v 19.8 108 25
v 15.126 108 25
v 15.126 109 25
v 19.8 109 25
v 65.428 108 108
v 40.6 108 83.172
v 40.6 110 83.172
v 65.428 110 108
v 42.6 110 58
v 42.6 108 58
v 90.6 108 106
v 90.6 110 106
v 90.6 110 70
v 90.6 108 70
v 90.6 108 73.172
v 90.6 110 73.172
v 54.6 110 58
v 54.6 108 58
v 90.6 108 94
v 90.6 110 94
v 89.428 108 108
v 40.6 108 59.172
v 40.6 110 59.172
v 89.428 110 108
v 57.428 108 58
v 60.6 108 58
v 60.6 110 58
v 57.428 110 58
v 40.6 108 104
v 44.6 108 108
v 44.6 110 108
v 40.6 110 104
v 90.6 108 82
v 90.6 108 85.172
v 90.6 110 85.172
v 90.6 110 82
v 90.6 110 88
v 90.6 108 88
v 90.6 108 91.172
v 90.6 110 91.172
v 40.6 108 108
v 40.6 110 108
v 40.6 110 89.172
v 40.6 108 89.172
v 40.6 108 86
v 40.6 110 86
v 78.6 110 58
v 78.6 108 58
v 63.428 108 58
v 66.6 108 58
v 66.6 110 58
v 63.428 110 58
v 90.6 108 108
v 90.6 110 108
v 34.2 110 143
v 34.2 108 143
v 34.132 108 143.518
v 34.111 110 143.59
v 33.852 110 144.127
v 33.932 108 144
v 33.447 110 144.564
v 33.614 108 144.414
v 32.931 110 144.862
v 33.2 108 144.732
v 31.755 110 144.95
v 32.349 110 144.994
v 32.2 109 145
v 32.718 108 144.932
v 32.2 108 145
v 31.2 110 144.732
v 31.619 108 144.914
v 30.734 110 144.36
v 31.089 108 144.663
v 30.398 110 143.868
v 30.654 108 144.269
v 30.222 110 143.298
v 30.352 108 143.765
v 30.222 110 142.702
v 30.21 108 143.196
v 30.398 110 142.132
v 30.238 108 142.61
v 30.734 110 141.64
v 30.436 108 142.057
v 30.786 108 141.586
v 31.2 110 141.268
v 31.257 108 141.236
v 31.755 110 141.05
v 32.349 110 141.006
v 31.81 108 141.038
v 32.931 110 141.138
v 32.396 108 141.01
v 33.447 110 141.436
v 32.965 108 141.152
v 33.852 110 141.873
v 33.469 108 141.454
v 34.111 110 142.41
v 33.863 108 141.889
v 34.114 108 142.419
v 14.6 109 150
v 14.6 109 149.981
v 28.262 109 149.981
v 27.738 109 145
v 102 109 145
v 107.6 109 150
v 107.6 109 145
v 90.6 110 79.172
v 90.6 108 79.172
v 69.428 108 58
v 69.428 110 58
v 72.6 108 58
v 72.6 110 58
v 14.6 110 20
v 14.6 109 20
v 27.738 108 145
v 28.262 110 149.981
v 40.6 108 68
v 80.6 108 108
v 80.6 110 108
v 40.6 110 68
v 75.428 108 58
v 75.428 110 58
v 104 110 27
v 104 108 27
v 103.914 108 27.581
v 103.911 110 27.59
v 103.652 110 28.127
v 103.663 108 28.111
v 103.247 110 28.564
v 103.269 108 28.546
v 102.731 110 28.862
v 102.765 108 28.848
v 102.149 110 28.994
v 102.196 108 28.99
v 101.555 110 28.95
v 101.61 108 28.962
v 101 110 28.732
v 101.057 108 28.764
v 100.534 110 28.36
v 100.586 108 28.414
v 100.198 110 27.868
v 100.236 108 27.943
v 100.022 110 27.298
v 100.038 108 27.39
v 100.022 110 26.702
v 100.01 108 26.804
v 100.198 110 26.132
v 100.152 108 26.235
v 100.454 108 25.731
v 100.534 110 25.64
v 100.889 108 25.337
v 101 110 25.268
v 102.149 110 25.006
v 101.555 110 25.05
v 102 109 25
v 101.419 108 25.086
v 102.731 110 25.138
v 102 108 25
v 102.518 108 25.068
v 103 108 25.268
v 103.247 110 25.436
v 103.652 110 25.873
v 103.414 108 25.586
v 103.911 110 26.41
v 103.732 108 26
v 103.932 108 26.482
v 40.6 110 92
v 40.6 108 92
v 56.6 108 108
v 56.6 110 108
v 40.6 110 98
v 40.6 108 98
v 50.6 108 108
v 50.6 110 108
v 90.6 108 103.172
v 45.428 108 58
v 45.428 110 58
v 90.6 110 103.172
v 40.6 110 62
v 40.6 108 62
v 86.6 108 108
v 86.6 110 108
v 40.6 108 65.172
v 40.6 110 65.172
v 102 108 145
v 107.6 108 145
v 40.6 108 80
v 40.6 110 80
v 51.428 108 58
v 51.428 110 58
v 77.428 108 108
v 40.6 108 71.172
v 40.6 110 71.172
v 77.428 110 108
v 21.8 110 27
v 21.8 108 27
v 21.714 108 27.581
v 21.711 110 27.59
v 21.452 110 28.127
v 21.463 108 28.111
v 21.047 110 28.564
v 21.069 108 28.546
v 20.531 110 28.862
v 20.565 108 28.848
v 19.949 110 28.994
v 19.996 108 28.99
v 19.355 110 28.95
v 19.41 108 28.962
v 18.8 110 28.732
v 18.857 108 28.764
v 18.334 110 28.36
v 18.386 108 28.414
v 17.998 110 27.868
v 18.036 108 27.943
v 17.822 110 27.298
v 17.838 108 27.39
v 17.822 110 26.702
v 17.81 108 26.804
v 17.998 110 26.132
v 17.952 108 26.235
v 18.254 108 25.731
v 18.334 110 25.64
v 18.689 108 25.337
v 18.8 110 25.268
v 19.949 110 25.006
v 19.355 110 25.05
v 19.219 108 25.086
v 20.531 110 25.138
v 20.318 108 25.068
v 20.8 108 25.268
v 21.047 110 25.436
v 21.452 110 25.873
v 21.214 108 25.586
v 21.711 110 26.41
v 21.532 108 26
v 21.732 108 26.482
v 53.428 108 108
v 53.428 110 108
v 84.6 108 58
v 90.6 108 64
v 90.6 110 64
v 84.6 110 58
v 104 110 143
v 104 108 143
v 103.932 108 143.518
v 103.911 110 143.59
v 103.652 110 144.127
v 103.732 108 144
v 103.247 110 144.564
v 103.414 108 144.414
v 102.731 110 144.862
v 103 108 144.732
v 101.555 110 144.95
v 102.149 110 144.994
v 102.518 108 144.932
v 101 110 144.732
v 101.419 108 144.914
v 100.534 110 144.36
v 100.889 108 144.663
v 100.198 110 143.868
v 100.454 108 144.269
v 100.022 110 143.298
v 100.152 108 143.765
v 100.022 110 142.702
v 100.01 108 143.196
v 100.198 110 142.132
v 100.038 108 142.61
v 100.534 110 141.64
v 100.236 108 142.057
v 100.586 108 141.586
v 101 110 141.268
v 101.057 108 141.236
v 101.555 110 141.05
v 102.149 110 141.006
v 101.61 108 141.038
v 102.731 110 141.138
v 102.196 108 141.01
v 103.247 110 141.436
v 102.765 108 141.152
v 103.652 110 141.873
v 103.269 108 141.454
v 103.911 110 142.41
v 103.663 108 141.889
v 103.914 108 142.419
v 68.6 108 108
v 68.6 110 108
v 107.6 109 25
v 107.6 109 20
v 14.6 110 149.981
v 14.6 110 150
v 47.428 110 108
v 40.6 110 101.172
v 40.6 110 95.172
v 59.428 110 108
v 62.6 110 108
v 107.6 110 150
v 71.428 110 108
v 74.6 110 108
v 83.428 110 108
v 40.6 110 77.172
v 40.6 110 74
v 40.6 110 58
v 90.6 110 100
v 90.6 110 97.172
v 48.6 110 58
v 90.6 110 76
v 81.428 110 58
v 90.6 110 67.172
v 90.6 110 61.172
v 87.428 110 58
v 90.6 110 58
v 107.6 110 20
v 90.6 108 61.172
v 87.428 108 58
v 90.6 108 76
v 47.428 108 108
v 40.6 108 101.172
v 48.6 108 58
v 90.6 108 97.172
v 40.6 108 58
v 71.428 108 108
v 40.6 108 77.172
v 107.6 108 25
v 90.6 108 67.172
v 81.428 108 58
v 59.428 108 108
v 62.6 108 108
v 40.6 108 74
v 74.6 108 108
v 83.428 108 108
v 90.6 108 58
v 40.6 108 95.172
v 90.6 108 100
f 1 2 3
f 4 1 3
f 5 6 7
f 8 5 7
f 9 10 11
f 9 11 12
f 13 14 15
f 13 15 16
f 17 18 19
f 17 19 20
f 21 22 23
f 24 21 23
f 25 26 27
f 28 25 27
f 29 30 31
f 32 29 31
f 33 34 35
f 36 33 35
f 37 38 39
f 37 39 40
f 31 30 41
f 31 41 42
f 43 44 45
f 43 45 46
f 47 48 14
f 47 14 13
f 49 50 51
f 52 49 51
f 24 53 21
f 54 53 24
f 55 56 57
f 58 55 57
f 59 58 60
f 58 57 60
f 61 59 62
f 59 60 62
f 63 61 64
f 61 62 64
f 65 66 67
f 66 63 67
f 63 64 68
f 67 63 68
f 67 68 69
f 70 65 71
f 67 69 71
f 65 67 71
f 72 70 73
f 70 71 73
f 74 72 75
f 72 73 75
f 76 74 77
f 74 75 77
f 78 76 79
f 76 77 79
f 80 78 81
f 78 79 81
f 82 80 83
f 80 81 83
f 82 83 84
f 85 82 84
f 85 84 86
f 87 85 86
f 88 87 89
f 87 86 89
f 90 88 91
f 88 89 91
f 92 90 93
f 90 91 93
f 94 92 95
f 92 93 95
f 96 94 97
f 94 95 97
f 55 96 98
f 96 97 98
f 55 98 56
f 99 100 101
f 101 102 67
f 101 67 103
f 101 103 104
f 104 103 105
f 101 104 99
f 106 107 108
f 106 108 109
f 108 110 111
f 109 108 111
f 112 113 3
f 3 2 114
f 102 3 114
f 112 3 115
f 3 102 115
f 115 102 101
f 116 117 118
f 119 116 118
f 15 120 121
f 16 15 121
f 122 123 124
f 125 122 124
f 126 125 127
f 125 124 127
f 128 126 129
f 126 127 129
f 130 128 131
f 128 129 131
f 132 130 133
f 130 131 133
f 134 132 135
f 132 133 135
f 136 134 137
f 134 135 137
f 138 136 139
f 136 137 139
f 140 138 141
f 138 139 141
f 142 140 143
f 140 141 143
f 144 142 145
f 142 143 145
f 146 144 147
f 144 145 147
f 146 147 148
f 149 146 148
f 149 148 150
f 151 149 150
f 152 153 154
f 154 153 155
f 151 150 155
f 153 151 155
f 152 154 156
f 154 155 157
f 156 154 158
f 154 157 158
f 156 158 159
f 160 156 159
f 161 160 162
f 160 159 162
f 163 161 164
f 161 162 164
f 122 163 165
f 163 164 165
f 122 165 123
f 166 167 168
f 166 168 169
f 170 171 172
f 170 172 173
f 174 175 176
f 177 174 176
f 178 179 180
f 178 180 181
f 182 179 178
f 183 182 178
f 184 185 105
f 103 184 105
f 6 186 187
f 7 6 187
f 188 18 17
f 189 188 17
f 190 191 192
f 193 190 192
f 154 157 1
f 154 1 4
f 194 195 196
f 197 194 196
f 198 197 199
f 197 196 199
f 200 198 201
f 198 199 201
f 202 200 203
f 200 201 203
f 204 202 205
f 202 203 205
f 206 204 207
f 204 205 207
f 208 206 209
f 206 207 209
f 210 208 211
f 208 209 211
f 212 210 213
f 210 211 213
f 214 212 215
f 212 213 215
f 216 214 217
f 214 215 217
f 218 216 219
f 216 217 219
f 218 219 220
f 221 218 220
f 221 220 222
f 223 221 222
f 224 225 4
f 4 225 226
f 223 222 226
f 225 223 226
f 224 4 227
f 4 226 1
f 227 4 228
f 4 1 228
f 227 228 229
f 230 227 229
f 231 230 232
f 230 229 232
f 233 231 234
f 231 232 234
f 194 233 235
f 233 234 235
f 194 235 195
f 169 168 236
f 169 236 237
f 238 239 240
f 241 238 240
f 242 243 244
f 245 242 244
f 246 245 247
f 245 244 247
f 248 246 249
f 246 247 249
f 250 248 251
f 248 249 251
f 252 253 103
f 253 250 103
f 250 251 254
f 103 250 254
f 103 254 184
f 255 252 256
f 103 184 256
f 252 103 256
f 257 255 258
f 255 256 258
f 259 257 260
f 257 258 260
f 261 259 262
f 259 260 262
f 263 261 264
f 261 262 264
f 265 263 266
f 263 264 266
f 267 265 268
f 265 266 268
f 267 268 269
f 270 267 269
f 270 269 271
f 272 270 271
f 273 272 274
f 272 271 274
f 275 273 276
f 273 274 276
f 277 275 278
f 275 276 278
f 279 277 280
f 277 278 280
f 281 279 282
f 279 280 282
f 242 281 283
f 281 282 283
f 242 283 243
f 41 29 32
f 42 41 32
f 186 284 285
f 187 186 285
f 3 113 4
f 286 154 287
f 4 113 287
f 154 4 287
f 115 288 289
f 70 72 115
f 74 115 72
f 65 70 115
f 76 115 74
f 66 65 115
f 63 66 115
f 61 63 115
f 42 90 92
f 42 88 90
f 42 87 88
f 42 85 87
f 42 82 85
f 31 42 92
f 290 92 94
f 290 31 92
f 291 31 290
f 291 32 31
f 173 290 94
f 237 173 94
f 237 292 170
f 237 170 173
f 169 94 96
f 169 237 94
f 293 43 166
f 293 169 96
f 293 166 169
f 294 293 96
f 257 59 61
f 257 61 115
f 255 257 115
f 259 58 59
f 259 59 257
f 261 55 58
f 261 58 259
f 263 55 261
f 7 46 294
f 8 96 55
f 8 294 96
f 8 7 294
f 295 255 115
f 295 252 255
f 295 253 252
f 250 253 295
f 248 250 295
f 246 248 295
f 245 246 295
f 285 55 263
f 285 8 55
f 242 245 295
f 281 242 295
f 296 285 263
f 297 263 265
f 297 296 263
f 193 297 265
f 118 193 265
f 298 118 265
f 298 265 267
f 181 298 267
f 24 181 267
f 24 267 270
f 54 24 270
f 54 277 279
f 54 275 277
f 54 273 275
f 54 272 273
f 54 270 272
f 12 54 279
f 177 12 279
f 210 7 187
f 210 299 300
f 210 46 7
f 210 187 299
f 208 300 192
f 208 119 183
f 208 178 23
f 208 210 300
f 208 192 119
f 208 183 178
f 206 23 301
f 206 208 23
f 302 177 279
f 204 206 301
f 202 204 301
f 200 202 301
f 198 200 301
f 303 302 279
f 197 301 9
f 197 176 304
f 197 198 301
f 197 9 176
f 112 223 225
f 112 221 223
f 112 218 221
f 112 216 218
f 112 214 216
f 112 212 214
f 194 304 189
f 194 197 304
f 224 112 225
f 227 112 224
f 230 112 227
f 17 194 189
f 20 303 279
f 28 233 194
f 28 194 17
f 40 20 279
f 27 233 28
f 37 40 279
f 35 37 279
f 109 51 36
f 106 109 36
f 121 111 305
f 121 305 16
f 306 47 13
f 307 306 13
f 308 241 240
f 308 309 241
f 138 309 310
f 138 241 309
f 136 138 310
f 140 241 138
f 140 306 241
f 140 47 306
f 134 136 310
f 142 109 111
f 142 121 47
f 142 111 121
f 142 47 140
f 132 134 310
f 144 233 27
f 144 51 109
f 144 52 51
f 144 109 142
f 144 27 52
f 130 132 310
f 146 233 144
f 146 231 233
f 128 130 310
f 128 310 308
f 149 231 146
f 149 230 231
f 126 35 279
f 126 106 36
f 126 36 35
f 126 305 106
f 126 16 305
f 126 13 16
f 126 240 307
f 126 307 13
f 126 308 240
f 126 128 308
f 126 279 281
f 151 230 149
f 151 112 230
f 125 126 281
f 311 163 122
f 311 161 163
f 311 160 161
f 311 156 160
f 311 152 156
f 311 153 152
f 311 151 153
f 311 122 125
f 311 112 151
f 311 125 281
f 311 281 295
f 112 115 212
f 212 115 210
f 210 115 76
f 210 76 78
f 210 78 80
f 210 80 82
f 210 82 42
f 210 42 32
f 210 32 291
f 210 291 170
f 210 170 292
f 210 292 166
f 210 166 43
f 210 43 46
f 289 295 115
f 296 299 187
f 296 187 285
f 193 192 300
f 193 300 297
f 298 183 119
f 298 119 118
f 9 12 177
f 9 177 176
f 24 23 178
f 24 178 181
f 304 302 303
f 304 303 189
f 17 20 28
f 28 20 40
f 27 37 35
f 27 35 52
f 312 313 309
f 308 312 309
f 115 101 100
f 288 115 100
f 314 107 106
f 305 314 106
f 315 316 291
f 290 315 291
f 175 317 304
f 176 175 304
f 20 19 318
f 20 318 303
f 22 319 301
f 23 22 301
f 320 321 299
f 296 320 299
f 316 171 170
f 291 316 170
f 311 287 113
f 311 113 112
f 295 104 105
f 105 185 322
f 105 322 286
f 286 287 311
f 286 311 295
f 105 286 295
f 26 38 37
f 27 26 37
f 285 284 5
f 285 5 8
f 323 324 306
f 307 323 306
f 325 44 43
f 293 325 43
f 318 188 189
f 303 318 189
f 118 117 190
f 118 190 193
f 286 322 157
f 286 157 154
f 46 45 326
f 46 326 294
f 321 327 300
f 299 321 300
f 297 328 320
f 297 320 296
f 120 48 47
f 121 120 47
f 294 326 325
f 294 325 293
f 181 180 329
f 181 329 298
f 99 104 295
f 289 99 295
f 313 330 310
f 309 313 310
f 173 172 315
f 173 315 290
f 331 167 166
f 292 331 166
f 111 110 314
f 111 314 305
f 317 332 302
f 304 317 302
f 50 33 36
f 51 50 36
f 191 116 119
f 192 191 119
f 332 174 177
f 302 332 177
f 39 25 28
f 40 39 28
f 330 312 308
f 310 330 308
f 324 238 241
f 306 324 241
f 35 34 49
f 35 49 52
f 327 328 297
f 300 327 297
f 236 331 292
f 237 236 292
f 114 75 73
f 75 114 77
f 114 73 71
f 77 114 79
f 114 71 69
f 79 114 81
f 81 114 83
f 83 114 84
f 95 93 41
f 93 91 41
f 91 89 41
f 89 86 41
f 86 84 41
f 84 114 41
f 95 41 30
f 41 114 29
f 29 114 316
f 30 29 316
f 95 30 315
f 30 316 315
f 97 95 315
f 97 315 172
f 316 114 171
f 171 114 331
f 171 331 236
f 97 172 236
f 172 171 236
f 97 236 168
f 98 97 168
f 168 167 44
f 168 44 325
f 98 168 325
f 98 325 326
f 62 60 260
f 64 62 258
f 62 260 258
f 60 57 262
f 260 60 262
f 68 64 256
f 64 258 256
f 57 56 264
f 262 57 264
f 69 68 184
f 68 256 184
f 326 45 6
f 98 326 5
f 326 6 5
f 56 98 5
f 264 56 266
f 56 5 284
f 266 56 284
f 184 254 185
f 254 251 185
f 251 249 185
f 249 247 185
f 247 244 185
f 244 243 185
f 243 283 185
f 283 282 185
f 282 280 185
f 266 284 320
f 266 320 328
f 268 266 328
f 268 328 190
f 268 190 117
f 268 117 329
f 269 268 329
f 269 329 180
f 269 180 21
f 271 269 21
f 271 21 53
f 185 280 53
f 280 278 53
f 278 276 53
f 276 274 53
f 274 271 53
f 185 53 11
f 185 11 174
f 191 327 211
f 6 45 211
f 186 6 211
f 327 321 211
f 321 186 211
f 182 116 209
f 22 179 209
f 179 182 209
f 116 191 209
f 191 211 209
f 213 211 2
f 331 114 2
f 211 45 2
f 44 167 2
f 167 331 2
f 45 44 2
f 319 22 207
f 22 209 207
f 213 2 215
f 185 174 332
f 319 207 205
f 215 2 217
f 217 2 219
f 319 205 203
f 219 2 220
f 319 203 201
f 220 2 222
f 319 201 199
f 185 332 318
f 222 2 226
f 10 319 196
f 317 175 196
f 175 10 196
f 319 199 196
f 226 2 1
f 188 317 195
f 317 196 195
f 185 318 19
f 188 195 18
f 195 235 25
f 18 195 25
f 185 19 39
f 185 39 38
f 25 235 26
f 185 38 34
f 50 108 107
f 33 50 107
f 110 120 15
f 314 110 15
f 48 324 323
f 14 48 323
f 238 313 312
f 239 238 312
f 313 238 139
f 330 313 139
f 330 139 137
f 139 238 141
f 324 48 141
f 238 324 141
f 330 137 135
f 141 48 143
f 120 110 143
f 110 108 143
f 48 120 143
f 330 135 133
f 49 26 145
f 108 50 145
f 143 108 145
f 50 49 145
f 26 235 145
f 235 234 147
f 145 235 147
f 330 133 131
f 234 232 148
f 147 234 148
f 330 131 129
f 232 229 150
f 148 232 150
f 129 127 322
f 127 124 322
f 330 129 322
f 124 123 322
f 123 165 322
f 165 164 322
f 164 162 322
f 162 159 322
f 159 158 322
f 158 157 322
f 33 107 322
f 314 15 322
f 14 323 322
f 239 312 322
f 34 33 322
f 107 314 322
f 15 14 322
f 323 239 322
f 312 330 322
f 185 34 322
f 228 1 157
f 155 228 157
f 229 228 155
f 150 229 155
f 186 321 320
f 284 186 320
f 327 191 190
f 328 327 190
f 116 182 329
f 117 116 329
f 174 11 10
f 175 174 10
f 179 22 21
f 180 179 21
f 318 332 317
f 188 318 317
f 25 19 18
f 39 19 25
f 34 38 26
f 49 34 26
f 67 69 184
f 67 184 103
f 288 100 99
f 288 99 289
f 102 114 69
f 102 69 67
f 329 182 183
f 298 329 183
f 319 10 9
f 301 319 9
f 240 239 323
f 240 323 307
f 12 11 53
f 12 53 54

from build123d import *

# Parameters (mm, degrees)
CYLINDER074_R          = 2
CYLINDER074_DEPTH      = 10
CYLINDER073_R          = 2
CYLINDER073_DEPTH      = 10
CYLINDER075_R          = 2
CYLINDER075_DEPTH      = 10
CYLINDER076_R          = 2
CYLINDER076_DEPTH      = 10
BOX103_W               = 1
BOX103_H               = 100
BOX103_DEPTH           = 5
BOX102_W               = 1
BOX102_H               = 100
BOX102_DEPTH           = 5
BOX100_W               = 2
BOX100_H               = 2
BOX100_DEPTH           = 80
BOX100_PLACEMENT_ANGLE = 45
BOX101_W               = 2
BOX101_H               = 2
BOX101_DEPTH           = 80
BOX101_PLACEMENT_ANGLE = 45
BOX097_W               = 2
BOX097_H               = 2
BOX097_DEPTH           = 80
BOX097_PLACEMENT_ANGLE = 45
BOX096_W               = 2
BOX096_H               = 2
BOX096_DEPTH           = 80
BOX096_PLACEMENT_ANGLE = 45
BOX095_W               = 2
BOX095_H               = 2
BOX095_DEPTH           = 80
BOX095_PLACEMENT_ANGLE = 45
BOX094_W               = 2
BOX094_H               = 2
BOX094_DEPTH           = 80
BOX094_PLACEMENT_ANGLE = 45
BOX093_W               = 2
BOX093_H               = 2
BOX093_DEPTH           = 80
BOX093_PLACEMENT_ANGLE = 45
BOX092_W               = 2
BOX092_H               = 2
BOX092_DEPTH           = 80
BOX092_PLACEMENT_ANGLE = 45
BOX091_W               = 2
BOX091_H               = 2
BOX091_DEPTH           = 80
BOX091_PLACEMENT_ANGLE = 45
BOX090_W               = 2
BOX090_H               = 2
BOX090_DEPTH           = 80
BOX090_PLACEMENT_ANGLE = 45
BOX089_W               = 2
BOX089_H               = 2
BOX089_DEPTH           = 80
BOX089_PLACEMENT_ANGLE = 45
BOX088_W               = 2
BOX088_H               = 2
BOX088_DEPTH           = 80
BOX088_PLACEMENT_ANGLE = 45
BOX087_W               = 2
BOX087_H               = 2
BOX087_DEPTH           = 80
BOX087_PLACEMENT_ANGLE = 45
BOX086_W               = 2
BOX086_H               = 2
BOX086_DEPTH           = 80
BOX086_PLACEMENT_ANGLE = 45
BOX084_W               = 2
BOX084_H               = 2
BOX084_DEPTH           = 80
BOX084_PLACEMENT_ANGLE = 45
BOX085_W               = 2
BOX085_H               = 2
BOX085_DEPTH           = 80
BOX085_PLACEMENT_ANGLE = 45
BOX099_W               = 2
BOX099_H               = 2
BOX099_DEPTH           = 80
BOX099_PLACEMENT_ANGLE = 45
BOX098_W               = 2
BOX098_H               = 50
BOX098_DEPTH           = 50
PAD014_DEPTH           = 5
BOX083_W               = 2
BOX083_H               = 93
BOX083_DEPTH           = 130
CUT076_PLACEMENT_ANGLE = 90


with BuildPart() as cylinder043:
    # Cylinder074 → Cylinder074 (new body)
    with BuildSketch(Plane(origin=(102, 0, 27), x_dir=(1, 0, 0), z_dir=(0, -1, 0))):
        Circle(CYLINDER074_R)
    extrude(amount=CYLINDER074_DEPTH)


with BuildPart() as cylinder042:
    # Cylinder073 → Cylinder073 (new body)
    with BuildSketch(Plane(origin=(19.8, 0, 27), x_dir=(1, 0, 0), z_dir=(0, -1, 0))):
        Circle(CYLINDER073_R)
    extrude(amount=CYLINDER073_DEPTH)


with BuildPart() as cylinder044:
    # Cylinder075 → Cylinder075 (new body)
    with BuildSketch(Plane(origin=(102, 0, 143), x_dir=(1, 0, 0), z_dir=(0, -1, 0))):
        Circle(CYLINDER075_R)
    extrude(amount=CYLINDER075_DEPTH)


with BuildPart() as loecher:
    # Cylinder076 → Cylinder076 (new body)
    with BuildSketch(Plane(origin=(32.2, 0, 143), x_dir=(1, 0, 0), z_dir=(0, -1, 0))):
        Circle(CYLINDER076_R)
    extrude(amount=CYLINDER076_DEPTH)

    # Fusion045: union Cylinder043, Cylinder042, Cylinder044
    add(cylinder043.part)
    add(cylinder042.part)
    add(cylinder044.part)


with BuildPart() as loecher_1:
    # Fusion045 placement: moved
    add(loecher.part.moved(Location((0, 5, 0))))


with BuildPart() as cube094:
    # Box103 → Box103 (new body)
    with BuildSketch(Plane.XY.offset(125)):
        with Locations((0.5, 50)):
            Rectangle(BOX103_W, BOX103_H)
    extrude(amount=BOX103_DEPTH)


with BuildPart() as anschlag:
    # Box102 → Box102 (new body)
    with BuildSketch(Plane.XY):
        with Locations((0.5, 50)):
            Rectangle(BOX102_W, BOX102_H)
    extrude(amount=BOX102_DEPTH)

    # Fusion044: union Cube094
    add(cube094.part)


with BuildPart() as cube091:
    # Box100 → Box100 (new body)
    with BuildSketch(Plane.XY):
        with Locations((1, 1)):
            Rectangle(BOX100_W, BOX100_H)
    extrude(amount=BOX100_DEPTH)


with BuildPart() as cube091_1:
    # Box100 placement: moved
    add(cube091.part.moved(Location((0, 90, 0))).rotate(Axis((0, 90, 0), (-1, 0, 0)), BOX100_PLACEMENT_ANGLE))


with BuildPart() as cube092:
    # Box101 → Box101 (new body)
    with BuildSketch(Plane.XY):
        with Locations((1, 1)):
            Rectangle(BOX101_W, BOX101_H)
    extrude(amount=BOX101_DEPTH)


with BuildPart() as cube092_1:
    # Box101 placement: moved
    add(cube092.part.moved(Location((0, 96, 0))).rotate(Axis((0, 96, 0), (-1, 0, 0)), BOX101_PLACEMENT_ANGLE))


with BuildPart() as cube088:
    # Box097 → Box097 (new body)
    with BuildSketch(Plane.XY):
        with Locations((1, 1)):
            Rectangle(BOX097_W, BOX097_H)
    extrude(amount=BOX097_DEPTH)


with BuildPart() as cube088_1:
    # Box097 placement: moved
    add(cube088.part.moved(Location((0, 78, 0))).rotate(Axis((0, 78, 0), (-1, 0, 0)), BOX097_PLACEMENT_ANGLE))


with BuildPart() as cube087:
    # Box096 → Box096 (new body)
    with BuildSketch(Plane.XY):
        with Locations((1, 1)):
            Rectangle(BOX096_W, BOX096_H)
    extrude(amount=BOX096_DEPTH)


with BuildPart() as cube087_1:
    # Box096 placement: moved
    add(cube087.part.moved(Location((0, 72, 0))).rotate(Axis((0, 72, 0), (-1, 0, 0)), BOX096_PLACEMENT_ANGLE))


with BuildPart() as cube086:
    # Box095 → Box095 (new body)
    with BuildSketch(Plane.XY):
        with Locations((1, 1)):
            Rectangle(BOX095_W, BOX095_H)
    extrude(amount=BOX095_DEPTH)


with BuildPart() as cube086_1:
    # Box095 placement: moved
    add(cube086.part.moved(Location((0, 66, 0))).rotate(Axis((0, 66, 0), (-1, 0, 0)), BOX095_PLACEMENT_ANGLE))


with BuildPart() as cube085:
    # Box094 → Box094 (new body)
    with BuildSketch(Plane.XY):
        with Locations((1, 1)):
            Rectangle(BOX094_W, BOX094_H)
    extrude(amount=BOX094_DEPTH)


with BuildPart() as cube085_1:
    # Box094 placement: moved
    add(cube085.part.moved(Location((0, 60, 0))).rotate(Axis((0, 60, 0), (-1, 0, 0)), BOX094_PLACEMENT_ANGLE))


with BuildPart() as cube084:
    # Box093 → Box093 (new body)
    with BuildSketch(Plane.XY):
        with Locations((1, 1)):
            Rectangle(BOX093_W, BOX093_H)
    extrude(amount=BOX093_DEPTH)


with BuildPart() as cube084_1:
    # Box093 placement: moved
    add(cube084.part.moved(Location((0, 54, 0))).rotate(Axis((0, 54, 0), (-1, 0, 0)), BOX093_PLACEMENT_ANGLE))


with BuildPart() as cube083:
    # Box092 → Box092 (new body)
    with BuildSketch(Plane.XY):
        with Locations((1, 1)):
            Rectangle(BOX092_W, BOX092_H)
    extrude(amount=BOX092_DEPTH)


with BuildPart() as cube083_1:
    # Box092 placement: moved
    add(cube083.part.moved(Location((0, 48, 0))).rotate(Axis((0, 48, 0), (-1, 0, 0)), BOX092_PLACEMENT_ANGLE))


with BuildPart() as cube082:
    # Box091 → Box091 (new body)
    with BuildSketch(Plane.XY):
        with Locations((1, 1)):
            Rectangle(BOX091_W, BOX091_H)
    extrude(amount=BOX091_DEPTH)


with BuildPart() as cube082_1:
    # Box091 placement: moved
    add(cube082.part.moved(Location((0, 42, 0))).rotate(Axis((0, 42, 0), (-1, 0, 0)), BOX091_PLACEMENT_ANGLE))


with BuildPart() as cube081:
    # Box090 → Box090 (new body)
    with BuildSketch(Plane.XY):
        with Locations((1, 1)):
            Rectangle(BOX090_W, BOX090_H)
    extrude(amount=BOX090_DEPTH)


with BuildPart() as cube081_1:
    # Box090 placement: moved
    add(cube081.part.moved(Location((0, 36, 0))).rotate(Axis((0, 36, 0), (-1, 0, 0)), BOX090_PLACEMENT_ANGLE))


with BuildPart() as cube080:
    # Box089 → Box089 (new body)
    with BuildSketch(Plane.XY):
        with Locations((1, 1)):
            Rectangle(BOX089_W, BOX089_H)
    extrude(amount=BOX089_DEPTH)


with BuildPart() as cube080_1:
    # Box089 placement: moved
    add(cube080.part.moved(Location((0, 30, 0))).rotate(Axis((0, 30, 0), (-1, 0, 0)), BOX089_PLACEMENT_ANGLE))


with BuildPart() as cube079:
    # Box088 → Box088 (new body)
    with BuildSketch(Plane.XY):
        with Locations((1, 1)):
            Rectangle(BOX088_W, BOX088_H)
    extrude(amount=BOX088_DEPTH)


with BuildPart() as cube079_1:
    # Box088 placement: moved
    add(cube079.part.moved(Location((0, 24, 0))).rotate(Axis((0, 24, 0), (-1, 0, 0)), BOX088_PLACEMENT_ANGLE))


with BuildPart() as cube078:
    # Box087 → Box087 (new body)
    with BuildSketch(Plane.XY):
        with Locations((1, 1)):
            Rectangle(BOX087_W, BOX087_H)
    extrude(amount=BOX087_DEPTH)


with BuildPart() as cube078_1:
    # Box087 placement: moved
    add(cube078.part.moved(Location((0, 18, 0))).rotate(Axis((0, 18, 0), (-1, 0, 0)), BOX087_PLACEMENT_ANGLE))


with BuildPart() as cube077:
    # Box086 → Box086 (new body)
    with BuildSketch(Plane.XY):
        with Locations((1, 1)):
            Rectangle(BOX086_W, BOX086_H)
    extrude(amount=BOX086_DEPTH)


with BuildPart() as cube077_1:
    # Box086 placement: moved
    add(cube077.part.moved(Location((0, 12, 0))).rotate(Axis((0, 12, 0), (-1, 0, 0)), BOX086_PLACEMENT_ANGLE))


with BuildPart() as cube075:
    # Box084 → Box084 (new body)
    with BuildSketch(Plane.XY):
        with Locations((1, 1)):
            Rectangle(BOX084_W, BOX084_H)
    extrude(amount=BOX084_DEPTH)


with BuildPart() as cube075_1:
    # Box084 placement: moved
    add(cube075.part.rotate(Axis((0, 0, 0), (-1, 0, 0)), BOX084_PLACEMENT_ANGLE))


with BuildPart() as cube076:
    # Box085 → Box085 (new body)
    with BuildSketch(Plane.XY):
        with Locations((1, 1)):
            Rectangle(BOX085_W, BOX085_H)
    extrude(amount=BOX085_DEPTH)


with BuildPart() as cube076_1:
    # Box085 placement: moved
    add(cube076.part.moved(Location((0, 6, 0))).rotate(Axis((0, 6, 0), (-1, 0, 0)), BOX085_PLACEMENT_ANGLE))


with BuildPart() as fusion043:
    # Box099 → Box099 (new body)
    with BuildSketch(Plane.XY):
        with Locations((1, 1)):
            Rectangle(BOX099_W, BOX099_H)
    extrude(amount=BOX099_DEPTH)


with BuildPart() as fusion043_1:
    # Box099 placement: moved
    add(fusion043.part.moved(Location((0, 84, 0))).rotate(Axis((0, 84, 0), (-1, 0, 0)), BOX099_PLACEMENT_ANGLE))

    # Fusion043: union Cube091, Cube092, Cube088, Cube087, Cube086, Cube085, Cube084, Cube083, Cube082, Cube081, Cube080, Cube079, Cube078, Cube077, Cube075, Cube076
    add(cube091_1.part)
    add(cube092_1.part)
    add(cube088_1.part)
    add(cube087_1.part)
    add(cube086_1.part)
    add(cube085_1.part)
    add(cube084_1.part)
    add(cube083_1.part)
    add(cube082_1.part)
    add(cube081_1.part)
    add(cube080_1.part)
    add(cube079_1.part)
    add(cube078_1.part)
    add(cube077_1.part)
    add(cube075_1.part)
    add(cube076_1.part)


with BuildPart() as schlitze:
    # Box098 → Box098 (new body)
    with BuildSketch(Plane(origin=(0, 46, 0), x_dir=(1, 0, 0), z_dir=(0, 0, 1))):
        with Locations((1, 25)):
            Rectangle(BOX098_W, BOX098_H)
    extrude(amount=BOX098_DEPTH)

    # Cut074: cut Fusion043
    add(fusion043_1.part, mode=Mode.SUBTRACT)


with BuildPart() as schlitze_1:
    # Cut074 placement: moved
    add(schlitze.part.moved(Location((0, -20, 38))))


with BuildPart() as pad014:
    # Sketch021 → Pad014 (new body)
    with BuildSketch(Plane.YZ):
        Polygon((0, 0), (13.661518, 129.980665), (0, 129.980665), align=None)
    extrude(amount=PAD014_DEPTH)


with BuildPart() as seitenw_schlitze_anschl_loecher:
    # Box083 → Box083 (new body)
    with BuildSketch(Plane.XY):
        with Locations((1, 46.5)):
            Rectangle(BOX083_W, BOX083_H)
    extrude(amount=BOX083_DEPTH)

    # Cut073: cut Pad014
    add(pad014.part, mode=Mode.SUBTRACT)

    # Cut075: cut Schlitze
    add(schlitze_1.part, mode=Mode.SUBTRACT)

    # Cut076: cut Anschlag
    add(anschlag.part, mode=Mode.SUBTRACT)


with BuildPart() as seitenw_schlitze_anschl_loecher_1:
    # Cut076 placement: moved
    add(seitenw_schlitze_anschl_loecher.part.moved(Location((14.6, 2, 20))).rotate(Axis((14.6, 2, 20), (0, 0, -1)), CUT076_PLACEMENT_ANGLE))

    # Cut077: cut Loecher
    add(loecher_1.part, mode=Mode.SUBTRACT)


with BuildPart() as part_mirroring011:
    # Part__Mirroring011: instance of Seitenw_Schlitze_Anschl_Loecher
    add(seitenw_schlitze_anschl_loecher_1.part.mirror(Plane(origin=(0, 0, 0), x_dir=(1, 0, 0), z_dir=(0, 1, 0))))


with BuildPart() as part_mirroring011_1:
    # Part__Mirroring011 placement: moved
    add(part_mirroring011.part.moved(Location((0, 110, 0))))


solid = part_mirroring011_1.part
